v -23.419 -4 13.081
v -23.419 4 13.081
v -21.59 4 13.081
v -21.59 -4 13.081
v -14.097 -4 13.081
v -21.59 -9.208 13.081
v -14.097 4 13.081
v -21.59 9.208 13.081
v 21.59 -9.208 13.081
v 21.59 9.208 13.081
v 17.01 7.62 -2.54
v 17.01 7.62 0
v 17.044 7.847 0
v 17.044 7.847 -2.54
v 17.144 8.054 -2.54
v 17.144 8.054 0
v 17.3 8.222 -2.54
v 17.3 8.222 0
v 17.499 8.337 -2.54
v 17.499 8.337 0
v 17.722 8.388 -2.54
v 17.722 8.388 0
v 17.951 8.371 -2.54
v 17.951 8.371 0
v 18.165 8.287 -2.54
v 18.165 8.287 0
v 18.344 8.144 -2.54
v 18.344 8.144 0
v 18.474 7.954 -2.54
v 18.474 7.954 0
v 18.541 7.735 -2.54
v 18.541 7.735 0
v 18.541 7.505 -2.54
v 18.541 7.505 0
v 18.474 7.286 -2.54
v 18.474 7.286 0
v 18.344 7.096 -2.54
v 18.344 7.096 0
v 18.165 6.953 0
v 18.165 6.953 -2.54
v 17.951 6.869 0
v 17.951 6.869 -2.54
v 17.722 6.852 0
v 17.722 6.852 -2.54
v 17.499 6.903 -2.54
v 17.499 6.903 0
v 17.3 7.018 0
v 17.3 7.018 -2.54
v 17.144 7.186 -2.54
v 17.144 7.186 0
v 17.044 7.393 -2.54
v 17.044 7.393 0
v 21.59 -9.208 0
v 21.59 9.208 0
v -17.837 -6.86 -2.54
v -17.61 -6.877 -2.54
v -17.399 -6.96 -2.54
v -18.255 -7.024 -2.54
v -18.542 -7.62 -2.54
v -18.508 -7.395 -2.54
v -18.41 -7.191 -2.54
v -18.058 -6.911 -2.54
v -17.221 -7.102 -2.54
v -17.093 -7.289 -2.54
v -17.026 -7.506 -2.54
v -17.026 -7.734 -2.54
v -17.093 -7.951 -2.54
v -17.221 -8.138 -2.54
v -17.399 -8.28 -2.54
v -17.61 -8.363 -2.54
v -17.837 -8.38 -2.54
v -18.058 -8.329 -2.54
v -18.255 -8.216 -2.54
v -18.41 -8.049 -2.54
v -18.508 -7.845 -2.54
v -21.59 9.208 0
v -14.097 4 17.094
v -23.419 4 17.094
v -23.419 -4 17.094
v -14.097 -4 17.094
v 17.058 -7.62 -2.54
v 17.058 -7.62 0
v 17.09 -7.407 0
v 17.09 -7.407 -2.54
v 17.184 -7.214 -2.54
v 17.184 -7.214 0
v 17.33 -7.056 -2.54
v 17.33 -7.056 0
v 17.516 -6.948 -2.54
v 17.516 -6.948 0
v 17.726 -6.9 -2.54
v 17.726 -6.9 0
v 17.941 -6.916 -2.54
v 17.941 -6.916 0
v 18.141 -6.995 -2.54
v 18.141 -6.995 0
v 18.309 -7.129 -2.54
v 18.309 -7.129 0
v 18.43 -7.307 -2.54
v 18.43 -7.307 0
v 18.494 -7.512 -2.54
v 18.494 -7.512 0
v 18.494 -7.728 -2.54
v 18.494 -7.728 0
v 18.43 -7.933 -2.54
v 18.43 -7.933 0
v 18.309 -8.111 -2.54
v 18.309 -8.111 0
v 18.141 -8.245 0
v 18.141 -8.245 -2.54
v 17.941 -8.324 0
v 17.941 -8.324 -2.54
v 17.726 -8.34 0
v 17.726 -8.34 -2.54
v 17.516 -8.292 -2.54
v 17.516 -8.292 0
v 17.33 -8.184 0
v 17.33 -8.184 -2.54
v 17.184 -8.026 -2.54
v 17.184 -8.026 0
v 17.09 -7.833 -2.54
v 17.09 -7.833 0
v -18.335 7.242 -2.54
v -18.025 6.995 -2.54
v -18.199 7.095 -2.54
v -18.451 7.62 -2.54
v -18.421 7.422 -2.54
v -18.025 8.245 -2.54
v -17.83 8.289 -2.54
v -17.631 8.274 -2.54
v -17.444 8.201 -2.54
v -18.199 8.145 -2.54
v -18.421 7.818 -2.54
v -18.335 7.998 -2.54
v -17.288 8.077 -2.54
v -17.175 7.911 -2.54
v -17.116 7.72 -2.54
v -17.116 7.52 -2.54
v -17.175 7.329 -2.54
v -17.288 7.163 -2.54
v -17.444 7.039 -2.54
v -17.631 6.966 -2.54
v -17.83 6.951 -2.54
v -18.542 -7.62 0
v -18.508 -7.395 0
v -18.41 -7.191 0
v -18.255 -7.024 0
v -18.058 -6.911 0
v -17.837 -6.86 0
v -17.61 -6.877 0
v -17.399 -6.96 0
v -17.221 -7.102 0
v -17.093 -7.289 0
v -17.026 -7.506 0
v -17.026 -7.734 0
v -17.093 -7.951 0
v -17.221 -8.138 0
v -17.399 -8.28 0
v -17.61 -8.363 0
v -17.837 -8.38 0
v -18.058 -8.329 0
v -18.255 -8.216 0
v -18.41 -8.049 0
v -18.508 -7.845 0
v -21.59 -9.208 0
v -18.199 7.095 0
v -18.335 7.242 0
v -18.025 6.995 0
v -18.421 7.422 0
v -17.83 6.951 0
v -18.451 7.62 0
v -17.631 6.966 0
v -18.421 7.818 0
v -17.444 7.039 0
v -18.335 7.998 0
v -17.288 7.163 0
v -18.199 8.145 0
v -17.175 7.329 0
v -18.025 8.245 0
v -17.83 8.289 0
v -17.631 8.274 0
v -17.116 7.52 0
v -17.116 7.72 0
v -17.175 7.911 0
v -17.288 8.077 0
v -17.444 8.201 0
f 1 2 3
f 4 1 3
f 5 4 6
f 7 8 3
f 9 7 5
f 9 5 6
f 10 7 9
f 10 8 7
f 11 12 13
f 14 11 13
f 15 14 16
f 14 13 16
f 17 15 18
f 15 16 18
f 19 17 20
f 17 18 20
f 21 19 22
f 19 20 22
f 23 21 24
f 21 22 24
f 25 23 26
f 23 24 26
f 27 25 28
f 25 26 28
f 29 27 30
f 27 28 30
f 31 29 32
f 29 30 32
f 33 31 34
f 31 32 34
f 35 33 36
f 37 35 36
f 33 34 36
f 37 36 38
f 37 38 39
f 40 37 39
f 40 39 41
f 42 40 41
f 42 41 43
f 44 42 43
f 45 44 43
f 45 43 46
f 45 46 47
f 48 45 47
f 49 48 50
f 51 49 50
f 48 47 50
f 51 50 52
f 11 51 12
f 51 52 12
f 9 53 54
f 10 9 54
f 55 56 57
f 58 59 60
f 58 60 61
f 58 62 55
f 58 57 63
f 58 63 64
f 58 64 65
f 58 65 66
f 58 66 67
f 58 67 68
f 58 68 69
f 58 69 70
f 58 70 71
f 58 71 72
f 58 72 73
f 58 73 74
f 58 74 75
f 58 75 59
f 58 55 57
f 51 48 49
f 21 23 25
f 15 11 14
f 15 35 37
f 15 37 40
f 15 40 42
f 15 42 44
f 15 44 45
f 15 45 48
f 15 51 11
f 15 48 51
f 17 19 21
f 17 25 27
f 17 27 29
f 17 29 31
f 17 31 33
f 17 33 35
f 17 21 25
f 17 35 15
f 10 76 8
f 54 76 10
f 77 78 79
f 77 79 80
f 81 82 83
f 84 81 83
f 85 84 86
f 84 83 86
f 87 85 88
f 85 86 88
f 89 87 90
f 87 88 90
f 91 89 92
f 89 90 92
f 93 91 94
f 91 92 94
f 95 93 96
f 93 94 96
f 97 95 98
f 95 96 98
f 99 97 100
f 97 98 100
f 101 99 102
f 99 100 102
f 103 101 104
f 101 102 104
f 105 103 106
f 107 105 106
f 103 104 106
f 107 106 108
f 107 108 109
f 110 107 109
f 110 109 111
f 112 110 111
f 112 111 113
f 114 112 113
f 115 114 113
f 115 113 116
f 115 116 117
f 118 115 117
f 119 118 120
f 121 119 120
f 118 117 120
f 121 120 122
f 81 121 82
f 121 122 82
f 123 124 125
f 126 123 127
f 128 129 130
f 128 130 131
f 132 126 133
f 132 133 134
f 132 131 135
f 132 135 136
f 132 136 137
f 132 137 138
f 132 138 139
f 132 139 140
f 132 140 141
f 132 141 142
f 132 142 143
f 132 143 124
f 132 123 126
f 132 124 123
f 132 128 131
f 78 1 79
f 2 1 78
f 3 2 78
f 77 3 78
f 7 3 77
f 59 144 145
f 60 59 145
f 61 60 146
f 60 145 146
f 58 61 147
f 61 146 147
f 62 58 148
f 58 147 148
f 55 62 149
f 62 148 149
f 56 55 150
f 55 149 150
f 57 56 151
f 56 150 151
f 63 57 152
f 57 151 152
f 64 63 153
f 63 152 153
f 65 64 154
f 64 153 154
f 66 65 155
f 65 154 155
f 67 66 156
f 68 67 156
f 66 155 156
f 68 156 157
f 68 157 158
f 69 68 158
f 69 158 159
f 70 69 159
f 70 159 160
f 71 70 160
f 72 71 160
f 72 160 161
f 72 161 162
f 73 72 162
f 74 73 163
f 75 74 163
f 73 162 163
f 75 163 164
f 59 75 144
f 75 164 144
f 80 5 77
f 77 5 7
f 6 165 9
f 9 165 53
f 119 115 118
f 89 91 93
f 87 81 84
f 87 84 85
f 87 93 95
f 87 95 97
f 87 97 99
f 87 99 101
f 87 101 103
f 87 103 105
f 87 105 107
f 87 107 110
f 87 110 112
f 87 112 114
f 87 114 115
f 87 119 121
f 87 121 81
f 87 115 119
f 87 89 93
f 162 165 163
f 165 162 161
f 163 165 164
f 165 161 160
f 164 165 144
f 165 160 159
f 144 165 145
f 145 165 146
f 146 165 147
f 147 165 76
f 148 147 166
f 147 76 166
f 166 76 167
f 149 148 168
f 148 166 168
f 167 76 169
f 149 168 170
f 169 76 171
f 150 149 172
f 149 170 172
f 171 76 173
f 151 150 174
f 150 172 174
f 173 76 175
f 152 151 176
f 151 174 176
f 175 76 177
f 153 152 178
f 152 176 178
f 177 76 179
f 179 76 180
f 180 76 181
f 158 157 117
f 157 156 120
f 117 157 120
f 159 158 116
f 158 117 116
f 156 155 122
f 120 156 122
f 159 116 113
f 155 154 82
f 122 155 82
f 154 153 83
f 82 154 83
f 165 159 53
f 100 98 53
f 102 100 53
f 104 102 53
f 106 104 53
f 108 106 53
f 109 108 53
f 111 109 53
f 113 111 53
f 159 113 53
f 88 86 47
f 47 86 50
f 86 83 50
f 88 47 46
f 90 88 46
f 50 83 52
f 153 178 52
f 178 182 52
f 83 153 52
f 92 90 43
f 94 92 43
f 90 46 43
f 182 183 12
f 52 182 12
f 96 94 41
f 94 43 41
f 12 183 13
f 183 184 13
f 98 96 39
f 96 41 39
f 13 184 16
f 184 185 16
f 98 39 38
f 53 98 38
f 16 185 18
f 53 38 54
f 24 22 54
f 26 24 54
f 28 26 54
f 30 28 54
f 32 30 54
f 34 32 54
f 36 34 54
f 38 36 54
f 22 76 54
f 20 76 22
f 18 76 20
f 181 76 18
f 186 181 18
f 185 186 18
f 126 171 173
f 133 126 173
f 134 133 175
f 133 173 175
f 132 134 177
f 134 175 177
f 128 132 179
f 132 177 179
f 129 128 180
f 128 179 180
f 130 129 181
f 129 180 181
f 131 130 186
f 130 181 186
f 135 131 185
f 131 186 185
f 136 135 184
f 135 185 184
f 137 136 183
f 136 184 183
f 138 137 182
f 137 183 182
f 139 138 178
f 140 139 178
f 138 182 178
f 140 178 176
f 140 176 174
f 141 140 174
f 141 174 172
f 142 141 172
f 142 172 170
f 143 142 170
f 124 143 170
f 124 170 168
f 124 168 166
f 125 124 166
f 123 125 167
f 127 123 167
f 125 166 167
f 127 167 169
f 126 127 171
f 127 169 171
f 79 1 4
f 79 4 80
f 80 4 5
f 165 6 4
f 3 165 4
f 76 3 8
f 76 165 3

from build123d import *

# Parameters (mm, degrees)
SKETCH1_W      = 43.18
SKETCH1_H      = 18.415
EXTRUDE1_DEPTH = 13.081
SKETCH2_R      = 0.769945783
SKETCH2_R_2    = 0.721607375
SKETCH2_R_3    = 0.762102327
SKETCH2_R_4    = 0.671282844
EXTRUDE2_DEPTH = 2.54
SKETCH4_W      = 9.3218
SKETCH4_H      = 8.001
EXTRUDE3_DEPTH = 4.0132


with BuildPart() as part:
    # Sketch1 → Extrude1 (new body)
    with BuildSketch(Plane.XY):
        Rectangle(SKETCH1_W, SKETCH1_H)
    extrude(amount=EXTRUDE1_DEPTH)

    # Sketch2 → Extrude2 (add)
    with BuildSketch(Plane(origin=(0, 0, 0), x_dir=(-1, 0, 0), z_dir=(0, 0, -1))):
        with Locations((-17.78, 7.62)):
            Circle(SKETCH2_R)
        with Locations((-17.78, -7.62)):
            Circle(SKETCH2_R_2)
        with Locations((17.78, -7.62)):
            Circle(SKETCH2_R_3)
        with Locations((17.78, 7.62)):
            Circle(SKETCH2_R_4)
    extrude(amount=EXTRUDE2_DEPTH)

    # Sketch4 → Extrude3 (add)
    with BuildSketch(Plane.XY.offset(13.081)):
        with Locations((-18.7579, 0)):
            Rectangle(SKETCH4_W, SKETCH4_H)
    extrude(amount=EXTRUDE3_DEPTH)


solid = part.part
